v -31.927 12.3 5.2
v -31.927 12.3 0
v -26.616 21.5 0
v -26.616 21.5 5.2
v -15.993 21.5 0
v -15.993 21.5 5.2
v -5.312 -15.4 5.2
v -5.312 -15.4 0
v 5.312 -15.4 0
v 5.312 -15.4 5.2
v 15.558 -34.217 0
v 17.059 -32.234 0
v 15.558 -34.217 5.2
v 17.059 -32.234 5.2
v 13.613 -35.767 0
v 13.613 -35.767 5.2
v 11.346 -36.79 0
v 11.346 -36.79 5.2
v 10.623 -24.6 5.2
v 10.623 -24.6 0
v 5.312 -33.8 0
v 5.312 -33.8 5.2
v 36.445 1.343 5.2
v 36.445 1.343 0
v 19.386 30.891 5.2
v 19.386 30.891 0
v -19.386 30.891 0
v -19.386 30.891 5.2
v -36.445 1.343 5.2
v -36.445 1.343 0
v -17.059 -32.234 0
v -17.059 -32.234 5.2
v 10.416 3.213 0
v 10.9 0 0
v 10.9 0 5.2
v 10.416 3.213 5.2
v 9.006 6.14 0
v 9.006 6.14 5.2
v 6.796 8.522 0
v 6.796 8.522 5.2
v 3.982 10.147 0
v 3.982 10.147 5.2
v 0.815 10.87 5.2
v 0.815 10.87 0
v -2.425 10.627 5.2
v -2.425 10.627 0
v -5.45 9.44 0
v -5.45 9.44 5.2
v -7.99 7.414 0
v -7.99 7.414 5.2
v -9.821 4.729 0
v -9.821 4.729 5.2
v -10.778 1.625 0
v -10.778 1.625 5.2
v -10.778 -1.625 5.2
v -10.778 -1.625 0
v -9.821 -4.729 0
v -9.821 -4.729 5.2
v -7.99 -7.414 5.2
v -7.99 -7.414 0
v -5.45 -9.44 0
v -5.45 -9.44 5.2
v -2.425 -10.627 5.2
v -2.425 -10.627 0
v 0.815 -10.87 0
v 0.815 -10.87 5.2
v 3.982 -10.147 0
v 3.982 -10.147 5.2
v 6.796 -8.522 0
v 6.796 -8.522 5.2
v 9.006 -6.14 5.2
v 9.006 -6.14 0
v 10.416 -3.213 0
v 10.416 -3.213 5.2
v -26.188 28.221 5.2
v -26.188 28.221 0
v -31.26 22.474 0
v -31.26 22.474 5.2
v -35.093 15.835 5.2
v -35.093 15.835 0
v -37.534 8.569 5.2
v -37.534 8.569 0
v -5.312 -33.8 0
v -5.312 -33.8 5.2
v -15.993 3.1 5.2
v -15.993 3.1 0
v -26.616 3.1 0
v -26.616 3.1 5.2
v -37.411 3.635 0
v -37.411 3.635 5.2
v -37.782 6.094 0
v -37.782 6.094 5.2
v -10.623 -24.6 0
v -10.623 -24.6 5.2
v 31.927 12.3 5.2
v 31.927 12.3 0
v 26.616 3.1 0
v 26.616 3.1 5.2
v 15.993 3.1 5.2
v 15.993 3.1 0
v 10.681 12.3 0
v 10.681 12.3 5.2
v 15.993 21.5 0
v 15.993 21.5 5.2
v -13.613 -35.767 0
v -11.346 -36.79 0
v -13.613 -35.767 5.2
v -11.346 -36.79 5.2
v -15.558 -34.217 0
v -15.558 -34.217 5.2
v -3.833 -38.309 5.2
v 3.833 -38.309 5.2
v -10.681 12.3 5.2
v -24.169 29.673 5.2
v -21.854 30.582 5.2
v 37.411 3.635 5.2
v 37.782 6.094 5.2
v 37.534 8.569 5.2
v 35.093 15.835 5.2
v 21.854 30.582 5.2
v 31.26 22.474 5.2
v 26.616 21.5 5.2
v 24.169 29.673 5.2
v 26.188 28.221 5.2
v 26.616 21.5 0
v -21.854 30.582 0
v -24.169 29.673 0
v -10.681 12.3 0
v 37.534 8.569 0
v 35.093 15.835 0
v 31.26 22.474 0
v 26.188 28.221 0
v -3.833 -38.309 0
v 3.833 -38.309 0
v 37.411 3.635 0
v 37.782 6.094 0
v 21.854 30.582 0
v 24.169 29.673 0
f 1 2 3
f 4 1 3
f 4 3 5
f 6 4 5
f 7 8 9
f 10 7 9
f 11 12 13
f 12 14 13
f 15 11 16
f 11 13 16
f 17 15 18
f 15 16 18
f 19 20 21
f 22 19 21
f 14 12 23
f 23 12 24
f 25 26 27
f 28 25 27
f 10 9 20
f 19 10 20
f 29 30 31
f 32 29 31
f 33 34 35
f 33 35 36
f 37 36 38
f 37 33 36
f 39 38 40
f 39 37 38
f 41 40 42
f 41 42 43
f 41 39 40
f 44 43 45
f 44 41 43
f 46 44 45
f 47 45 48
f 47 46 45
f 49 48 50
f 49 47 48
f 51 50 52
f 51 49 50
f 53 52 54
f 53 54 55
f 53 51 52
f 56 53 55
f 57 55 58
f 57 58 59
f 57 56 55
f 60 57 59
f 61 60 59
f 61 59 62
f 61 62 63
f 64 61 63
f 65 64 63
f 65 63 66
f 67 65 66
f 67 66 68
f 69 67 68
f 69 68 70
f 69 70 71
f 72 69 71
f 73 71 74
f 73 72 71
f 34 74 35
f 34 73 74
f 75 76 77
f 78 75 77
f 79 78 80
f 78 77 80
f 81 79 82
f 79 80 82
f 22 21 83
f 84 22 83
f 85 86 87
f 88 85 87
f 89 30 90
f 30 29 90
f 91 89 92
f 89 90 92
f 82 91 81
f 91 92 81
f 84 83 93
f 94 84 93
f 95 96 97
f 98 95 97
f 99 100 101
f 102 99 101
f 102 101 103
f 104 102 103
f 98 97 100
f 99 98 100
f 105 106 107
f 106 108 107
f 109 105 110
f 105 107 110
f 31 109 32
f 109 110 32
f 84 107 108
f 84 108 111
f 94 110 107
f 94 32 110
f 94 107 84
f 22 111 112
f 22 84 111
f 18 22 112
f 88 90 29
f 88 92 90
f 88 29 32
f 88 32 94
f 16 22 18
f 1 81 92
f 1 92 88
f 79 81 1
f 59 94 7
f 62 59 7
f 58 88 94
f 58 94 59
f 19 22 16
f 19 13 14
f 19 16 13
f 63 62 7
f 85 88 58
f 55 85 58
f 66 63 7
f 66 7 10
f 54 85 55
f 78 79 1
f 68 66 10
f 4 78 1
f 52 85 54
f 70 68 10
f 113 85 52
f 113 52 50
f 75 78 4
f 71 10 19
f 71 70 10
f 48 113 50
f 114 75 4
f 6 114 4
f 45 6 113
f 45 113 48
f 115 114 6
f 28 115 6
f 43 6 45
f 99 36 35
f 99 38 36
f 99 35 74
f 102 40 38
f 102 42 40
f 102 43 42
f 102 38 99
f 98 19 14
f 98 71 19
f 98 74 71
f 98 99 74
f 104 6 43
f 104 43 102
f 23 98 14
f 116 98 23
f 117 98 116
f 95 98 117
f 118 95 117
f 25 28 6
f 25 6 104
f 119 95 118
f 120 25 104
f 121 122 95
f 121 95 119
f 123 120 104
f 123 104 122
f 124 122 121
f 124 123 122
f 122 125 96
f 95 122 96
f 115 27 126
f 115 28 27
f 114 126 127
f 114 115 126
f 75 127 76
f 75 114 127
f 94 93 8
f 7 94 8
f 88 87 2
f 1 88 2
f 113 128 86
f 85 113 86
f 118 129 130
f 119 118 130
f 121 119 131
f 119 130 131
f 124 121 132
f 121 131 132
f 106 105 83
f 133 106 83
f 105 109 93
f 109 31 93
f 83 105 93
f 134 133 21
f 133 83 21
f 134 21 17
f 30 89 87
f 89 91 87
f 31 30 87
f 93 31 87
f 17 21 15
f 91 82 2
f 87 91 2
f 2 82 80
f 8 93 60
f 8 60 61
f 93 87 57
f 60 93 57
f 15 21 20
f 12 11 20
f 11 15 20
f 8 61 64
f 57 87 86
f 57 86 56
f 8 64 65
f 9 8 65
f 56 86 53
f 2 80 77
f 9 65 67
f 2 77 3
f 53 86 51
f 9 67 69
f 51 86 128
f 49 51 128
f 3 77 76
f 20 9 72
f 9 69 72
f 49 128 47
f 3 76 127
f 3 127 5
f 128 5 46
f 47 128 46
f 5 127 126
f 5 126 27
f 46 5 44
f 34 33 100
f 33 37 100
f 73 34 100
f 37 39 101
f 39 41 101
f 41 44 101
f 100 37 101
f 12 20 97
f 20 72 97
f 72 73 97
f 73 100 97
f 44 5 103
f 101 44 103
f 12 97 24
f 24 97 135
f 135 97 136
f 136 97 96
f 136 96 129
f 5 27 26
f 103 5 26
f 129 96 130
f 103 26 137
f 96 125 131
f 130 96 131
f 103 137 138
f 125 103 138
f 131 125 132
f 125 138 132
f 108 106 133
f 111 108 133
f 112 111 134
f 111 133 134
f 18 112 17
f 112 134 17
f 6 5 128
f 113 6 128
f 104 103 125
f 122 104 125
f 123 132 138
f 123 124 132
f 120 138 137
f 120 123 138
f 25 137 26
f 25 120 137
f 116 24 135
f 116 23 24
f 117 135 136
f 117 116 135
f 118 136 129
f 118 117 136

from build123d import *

# Parameters (mm, degrees)
F0_R     = 10.9
F1_DEPTH = 5.2
F2_R     = 10


with BuildPart() as f1:
    # F0 (on Top) → F1 (new body)
    with BuildSketch(Plane.XY):
        with BuildLine():
            Line((15.263414, -35.34513), (38.241487, 4.454061))
            ThreePointArc((38.241487, 4.454061), (33.341978, 19.25), (22.978074, 30.891069))
            Line((22.978074, 30.891069), (-22.978074, 30.891069))
            ThreePointArc((-22.978074, 30.891069), (-33.341978, 19.25), (-38.241487, 4.454061))
            Line((-38.241487, 4.454061), (-15.263414, -35.34513))
            ThreePointArc((-15.263414, -35.34513), (0, -38.5), (15.263414, -35.34513))
        make_face()
        Polygon((-5.311622, -15.4), (5.311622, -15.4), (10.623245, -24.6), (5.311622, -33.8), (-5.311622, -33.8), (-10.623245, -24.6), align=None, mode=Mode.SUBTRACT)
        Polygon((-26.615847, 3.1), (-31.92747, 12.3), (-26.615847, 21.5), (-15.992602, 21.5), (-10.68098, 12.3), (-15.992602, 3.1), align=None, mode=Mode.SUBTRACT)
        Circle(F0_R, mode=Mode.SUBTRACT)
        Polygon((15.992602, 21.5), (26.615847, 21.5), (31.92747, 12.3), (26.615847, 3.1), (15.992602, 3.1), (10.68098, 12.3), align=None, mode=Mode.SUBTRACT)
    extrude(amount=F1_DEPTH)

    # F2
    f2_edges = [f1.edges().sort_by_distance(p)[0] for p in [
        (-38.241487, 4.454061, 2.6),
        (-22.978074, 30.891069, 2.6),
        (22.978074, 30.891069, 2.6),
        (38.241487, 4.454061, 2.6),
        (15.263414, -35.34513, 2.6),
        (-15.263414, -35.34513, 2.6),
    ]]
    fillet(f2_edges, radius=F2_R)


solid = f1.part
